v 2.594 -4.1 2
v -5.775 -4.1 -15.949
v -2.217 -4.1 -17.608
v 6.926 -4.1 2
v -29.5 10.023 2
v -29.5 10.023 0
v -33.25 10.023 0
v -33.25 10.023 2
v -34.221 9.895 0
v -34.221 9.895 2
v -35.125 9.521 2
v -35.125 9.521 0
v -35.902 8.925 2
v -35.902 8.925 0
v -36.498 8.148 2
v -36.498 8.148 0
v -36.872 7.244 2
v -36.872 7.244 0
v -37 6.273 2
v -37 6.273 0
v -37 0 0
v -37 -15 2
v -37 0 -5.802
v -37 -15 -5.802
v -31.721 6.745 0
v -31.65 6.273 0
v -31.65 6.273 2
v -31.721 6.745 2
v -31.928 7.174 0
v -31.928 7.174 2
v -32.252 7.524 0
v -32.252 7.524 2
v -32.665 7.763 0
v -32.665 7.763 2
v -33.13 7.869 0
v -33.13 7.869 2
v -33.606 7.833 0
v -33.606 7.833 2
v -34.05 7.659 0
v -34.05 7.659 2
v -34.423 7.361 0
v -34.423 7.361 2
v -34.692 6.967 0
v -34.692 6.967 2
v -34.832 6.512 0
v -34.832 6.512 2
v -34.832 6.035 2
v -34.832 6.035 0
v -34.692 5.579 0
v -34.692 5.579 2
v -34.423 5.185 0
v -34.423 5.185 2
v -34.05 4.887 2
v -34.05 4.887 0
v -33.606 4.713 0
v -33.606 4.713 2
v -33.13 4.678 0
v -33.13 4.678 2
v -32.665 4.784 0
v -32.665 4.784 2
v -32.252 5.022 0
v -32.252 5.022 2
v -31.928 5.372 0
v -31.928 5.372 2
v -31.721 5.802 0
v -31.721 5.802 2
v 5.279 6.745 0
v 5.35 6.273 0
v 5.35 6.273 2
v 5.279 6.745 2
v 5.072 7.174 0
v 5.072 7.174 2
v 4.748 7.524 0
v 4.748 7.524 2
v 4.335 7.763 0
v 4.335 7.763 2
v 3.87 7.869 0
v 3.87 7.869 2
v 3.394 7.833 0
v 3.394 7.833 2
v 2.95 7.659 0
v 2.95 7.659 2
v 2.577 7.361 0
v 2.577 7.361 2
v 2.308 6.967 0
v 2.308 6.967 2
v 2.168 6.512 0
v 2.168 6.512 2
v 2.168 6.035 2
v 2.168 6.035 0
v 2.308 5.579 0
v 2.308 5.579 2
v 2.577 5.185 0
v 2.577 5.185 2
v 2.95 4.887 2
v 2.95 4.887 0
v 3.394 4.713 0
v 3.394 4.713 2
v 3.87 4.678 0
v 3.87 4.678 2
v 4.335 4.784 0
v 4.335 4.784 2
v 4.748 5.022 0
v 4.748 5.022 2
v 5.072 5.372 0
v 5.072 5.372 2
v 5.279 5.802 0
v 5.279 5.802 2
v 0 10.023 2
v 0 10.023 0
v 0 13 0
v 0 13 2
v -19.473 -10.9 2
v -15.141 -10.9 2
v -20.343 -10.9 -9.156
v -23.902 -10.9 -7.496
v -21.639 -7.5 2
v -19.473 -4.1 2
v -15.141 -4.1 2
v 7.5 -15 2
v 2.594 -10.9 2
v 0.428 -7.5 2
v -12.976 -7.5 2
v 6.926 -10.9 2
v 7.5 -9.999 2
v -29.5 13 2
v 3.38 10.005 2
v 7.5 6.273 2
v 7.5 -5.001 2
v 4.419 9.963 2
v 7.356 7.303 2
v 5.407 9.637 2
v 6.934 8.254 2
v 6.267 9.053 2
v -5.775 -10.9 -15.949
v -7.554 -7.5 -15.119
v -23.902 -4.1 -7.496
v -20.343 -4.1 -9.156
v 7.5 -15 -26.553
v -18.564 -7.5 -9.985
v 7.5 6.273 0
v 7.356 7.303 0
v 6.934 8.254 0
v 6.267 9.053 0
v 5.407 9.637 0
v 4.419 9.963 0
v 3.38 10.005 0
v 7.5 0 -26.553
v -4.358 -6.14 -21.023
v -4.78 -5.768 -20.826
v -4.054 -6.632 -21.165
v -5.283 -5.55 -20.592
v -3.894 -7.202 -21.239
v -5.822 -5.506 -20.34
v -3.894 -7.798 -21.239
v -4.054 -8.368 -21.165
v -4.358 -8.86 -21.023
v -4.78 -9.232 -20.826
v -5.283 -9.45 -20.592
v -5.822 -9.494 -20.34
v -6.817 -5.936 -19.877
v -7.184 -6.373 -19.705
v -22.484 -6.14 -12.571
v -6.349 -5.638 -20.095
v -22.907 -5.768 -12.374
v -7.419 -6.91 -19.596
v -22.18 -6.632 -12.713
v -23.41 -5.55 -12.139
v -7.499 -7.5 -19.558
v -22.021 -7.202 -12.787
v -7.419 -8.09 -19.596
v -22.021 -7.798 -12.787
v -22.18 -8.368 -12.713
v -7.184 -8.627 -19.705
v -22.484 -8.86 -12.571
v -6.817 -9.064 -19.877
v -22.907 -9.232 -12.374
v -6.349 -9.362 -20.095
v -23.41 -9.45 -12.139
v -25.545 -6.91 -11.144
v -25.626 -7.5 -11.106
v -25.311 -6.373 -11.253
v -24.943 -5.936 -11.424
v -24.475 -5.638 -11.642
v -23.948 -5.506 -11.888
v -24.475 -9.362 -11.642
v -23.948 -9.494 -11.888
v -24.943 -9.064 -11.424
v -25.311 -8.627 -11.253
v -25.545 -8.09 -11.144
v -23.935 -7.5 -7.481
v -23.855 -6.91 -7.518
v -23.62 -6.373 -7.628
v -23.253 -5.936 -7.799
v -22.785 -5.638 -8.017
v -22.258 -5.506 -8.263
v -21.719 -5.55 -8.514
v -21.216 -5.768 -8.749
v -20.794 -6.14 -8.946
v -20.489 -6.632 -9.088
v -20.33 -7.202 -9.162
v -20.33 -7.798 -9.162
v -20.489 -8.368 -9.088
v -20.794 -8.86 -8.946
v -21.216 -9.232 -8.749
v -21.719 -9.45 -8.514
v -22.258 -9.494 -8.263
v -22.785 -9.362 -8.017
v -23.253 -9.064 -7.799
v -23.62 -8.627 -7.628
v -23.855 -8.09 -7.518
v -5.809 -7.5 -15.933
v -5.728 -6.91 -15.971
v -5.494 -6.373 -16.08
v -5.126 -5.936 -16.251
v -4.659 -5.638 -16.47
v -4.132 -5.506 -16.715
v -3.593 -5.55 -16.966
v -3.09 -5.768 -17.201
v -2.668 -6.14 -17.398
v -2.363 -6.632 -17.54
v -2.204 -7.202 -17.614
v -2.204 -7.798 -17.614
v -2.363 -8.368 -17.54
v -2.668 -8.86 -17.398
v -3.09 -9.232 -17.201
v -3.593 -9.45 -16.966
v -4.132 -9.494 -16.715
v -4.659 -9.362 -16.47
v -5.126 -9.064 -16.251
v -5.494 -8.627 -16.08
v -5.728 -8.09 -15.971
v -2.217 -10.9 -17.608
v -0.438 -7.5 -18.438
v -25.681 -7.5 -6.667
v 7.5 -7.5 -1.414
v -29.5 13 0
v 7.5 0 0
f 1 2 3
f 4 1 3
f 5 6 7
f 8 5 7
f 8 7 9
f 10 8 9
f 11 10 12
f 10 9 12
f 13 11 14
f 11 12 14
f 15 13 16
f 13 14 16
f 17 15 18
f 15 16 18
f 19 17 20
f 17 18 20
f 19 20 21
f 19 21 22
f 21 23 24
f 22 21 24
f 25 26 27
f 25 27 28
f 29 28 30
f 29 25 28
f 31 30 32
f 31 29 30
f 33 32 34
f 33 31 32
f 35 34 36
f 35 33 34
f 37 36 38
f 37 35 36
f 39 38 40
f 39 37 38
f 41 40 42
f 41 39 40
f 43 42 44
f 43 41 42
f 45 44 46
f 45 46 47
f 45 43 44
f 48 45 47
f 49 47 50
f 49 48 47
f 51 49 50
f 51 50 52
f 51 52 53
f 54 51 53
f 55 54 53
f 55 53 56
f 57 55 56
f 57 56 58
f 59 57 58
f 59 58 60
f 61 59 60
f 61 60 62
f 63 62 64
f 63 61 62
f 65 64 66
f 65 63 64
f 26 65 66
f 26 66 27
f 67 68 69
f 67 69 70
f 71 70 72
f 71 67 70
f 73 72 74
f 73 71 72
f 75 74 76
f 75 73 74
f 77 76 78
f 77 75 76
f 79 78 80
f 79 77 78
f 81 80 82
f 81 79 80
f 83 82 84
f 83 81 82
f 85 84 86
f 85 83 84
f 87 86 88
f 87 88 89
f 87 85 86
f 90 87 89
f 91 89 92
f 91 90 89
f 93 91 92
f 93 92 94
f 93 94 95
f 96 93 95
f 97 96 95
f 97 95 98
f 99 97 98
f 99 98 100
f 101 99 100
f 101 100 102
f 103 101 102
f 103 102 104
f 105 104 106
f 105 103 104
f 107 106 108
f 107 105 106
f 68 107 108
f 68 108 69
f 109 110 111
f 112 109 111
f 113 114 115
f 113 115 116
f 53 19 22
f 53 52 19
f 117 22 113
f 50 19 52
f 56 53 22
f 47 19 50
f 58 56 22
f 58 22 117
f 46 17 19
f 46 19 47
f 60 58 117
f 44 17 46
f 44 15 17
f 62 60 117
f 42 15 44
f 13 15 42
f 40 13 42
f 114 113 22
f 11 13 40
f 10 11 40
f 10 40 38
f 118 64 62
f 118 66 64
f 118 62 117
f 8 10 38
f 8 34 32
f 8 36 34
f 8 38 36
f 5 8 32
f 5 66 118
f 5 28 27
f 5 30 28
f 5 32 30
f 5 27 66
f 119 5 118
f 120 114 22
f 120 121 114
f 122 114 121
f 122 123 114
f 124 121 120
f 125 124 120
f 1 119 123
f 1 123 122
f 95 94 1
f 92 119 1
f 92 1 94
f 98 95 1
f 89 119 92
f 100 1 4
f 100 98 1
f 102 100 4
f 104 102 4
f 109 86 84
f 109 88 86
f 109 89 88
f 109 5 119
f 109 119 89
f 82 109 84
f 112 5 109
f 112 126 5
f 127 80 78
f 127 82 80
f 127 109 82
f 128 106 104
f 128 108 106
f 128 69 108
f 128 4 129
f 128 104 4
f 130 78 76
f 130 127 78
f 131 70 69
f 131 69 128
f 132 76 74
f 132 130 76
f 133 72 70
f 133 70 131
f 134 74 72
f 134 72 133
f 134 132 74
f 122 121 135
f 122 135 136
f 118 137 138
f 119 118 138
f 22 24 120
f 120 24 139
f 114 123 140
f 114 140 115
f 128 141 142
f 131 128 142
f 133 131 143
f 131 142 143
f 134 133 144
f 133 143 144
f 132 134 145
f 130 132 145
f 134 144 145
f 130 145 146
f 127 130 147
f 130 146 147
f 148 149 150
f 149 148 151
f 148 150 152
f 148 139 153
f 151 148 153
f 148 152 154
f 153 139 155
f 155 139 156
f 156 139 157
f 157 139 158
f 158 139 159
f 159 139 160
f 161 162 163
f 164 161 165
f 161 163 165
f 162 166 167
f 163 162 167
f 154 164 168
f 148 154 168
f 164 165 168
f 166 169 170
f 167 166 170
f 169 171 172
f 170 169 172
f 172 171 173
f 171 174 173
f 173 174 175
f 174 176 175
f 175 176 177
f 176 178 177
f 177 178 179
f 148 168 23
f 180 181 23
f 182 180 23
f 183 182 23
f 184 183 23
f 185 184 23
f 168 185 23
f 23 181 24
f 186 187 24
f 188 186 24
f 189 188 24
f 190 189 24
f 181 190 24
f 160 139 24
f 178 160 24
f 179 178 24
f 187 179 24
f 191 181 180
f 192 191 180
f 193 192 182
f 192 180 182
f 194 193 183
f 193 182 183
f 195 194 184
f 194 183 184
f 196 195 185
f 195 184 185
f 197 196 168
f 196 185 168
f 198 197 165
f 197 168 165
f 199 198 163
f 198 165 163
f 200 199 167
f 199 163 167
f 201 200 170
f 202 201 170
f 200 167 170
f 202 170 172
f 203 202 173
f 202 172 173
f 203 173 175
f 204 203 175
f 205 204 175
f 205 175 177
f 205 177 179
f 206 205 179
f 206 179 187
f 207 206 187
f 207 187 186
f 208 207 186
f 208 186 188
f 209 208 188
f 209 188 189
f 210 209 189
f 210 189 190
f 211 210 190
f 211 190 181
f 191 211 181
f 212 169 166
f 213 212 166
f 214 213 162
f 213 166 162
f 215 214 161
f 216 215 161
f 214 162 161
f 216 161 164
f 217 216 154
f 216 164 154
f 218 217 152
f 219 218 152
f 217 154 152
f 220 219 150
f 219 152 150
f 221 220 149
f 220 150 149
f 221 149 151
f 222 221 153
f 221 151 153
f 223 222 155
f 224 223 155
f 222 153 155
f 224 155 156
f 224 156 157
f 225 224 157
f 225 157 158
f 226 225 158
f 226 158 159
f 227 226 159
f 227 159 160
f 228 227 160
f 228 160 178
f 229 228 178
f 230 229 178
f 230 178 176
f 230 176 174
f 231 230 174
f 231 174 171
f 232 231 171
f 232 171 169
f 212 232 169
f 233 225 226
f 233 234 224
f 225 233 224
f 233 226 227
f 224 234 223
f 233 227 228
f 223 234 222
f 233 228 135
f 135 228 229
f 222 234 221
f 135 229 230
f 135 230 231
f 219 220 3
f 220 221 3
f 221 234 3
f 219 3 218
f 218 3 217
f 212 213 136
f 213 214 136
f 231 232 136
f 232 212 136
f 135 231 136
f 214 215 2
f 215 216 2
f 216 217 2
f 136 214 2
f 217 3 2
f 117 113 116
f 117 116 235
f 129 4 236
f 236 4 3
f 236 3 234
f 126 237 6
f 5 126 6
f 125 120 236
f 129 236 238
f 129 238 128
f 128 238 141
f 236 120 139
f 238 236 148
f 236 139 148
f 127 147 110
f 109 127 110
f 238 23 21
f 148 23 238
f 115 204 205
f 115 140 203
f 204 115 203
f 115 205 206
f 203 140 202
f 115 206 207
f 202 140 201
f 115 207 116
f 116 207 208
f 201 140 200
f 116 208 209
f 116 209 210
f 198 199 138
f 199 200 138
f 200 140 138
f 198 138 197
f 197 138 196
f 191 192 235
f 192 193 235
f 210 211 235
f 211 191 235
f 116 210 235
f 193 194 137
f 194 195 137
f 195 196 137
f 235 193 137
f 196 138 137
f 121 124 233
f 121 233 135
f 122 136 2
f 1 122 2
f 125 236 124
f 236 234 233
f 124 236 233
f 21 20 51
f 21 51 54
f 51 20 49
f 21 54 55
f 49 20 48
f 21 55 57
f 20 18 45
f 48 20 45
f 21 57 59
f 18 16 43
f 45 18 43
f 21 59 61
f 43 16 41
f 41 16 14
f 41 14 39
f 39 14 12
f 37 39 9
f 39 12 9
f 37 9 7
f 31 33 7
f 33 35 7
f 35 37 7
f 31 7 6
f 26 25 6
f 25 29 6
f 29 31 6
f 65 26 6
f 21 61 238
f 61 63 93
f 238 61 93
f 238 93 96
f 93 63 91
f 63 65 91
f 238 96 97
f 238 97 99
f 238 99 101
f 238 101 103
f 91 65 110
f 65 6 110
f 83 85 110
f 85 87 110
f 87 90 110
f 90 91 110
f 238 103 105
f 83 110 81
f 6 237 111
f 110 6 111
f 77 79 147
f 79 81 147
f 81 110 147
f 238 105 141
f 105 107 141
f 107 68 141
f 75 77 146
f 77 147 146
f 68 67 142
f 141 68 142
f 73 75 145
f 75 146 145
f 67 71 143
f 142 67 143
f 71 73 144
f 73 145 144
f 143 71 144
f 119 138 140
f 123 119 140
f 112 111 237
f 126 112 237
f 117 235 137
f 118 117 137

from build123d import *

# Parameters (mm, degrees)
SKETCH1_R           = 3.75
SKETCH1_R_2         = 1.6
BOSS_EXTRUDE1_DEPTH = 2
BOSS_EXTRUDE2_START = -15
BOSS_EXTRUDE2_DEPTH = 15
BOSS_EXTRUDE3_DEPTH = 2
SKETCH2_R           = 2
CUT_EXTRUDE1_DEPTH  = 39.169212171
CUT_EXTRUDE2_START  = -4
SKETCH2_3_R         = 2
CUT_EXTRUDE2_DEPTH  = 35.169212171


# Read off the part's stored shape, not the designer's step: Boss-Extrude2
with BuildPart() as part:
    # Sketch1 → Boss-Extrude1 (new body)
    # profile 1 of 5: a face of its own
    with BuildSketch(Plane.XY):
        with Locations((-33.25, 6.273123532)):
            Circle(SKETCH1_R)
        with Locations((-33.25, 6.273123532)):
            Circle(SKETCH1_R_2, mode=Mode.SUBTRACT)
    # profile 2 of 5: a face of its own
    with BuildSketch(Plane.XY):
        with BuildLine():
            Line((0, 2.523123532), (3.75, 2.523123532))
            ThreePointArc((3.75, 2.523123532), (0.004577287, 6.087897443), (3.38, 10.004825556))
            Line((3.38, 10.004825556), (0, 10.023123532))
            Line((0, 10.023123532), (0, 13))
            Line((0, 13), (-29.5, 13))
            Line((-29.5, 13), (-29.5, 10.023123532))
            Line((-29.5, 10.023123532), (-33.25, 10.023123532))
            ThreePointArc((-33.25, 10.023123532), (-30.598349571, 8.924773961), (-29.5, 6.273123532))
            ThreePointArc((-29.5, 6.273123532), (-30.598349571, 3.621473102), (-33.25, 2.523123532))
            Line((-33.25, 2.523123532), (-29.5, 2.523123532))
            Line((-29.5, 2.523123532), (-29.5, 0))
            Line((-29.5, 0), (0, 0))
            Line((0, 0), (0, 2.523123532))
        make_face()
    # profile 3 of 5: a face of its own
    with BuildSketch(Plane.XY):
        with Locations((3.75, 6.273123532)):
            Circle(SKETCH1_R)
        with Locations((3.75, 6.273123532)):
            Circle(SKETCH1_R_2, mode=Mode.SUBTRACT)
    # profile 4 of 5: a face of its own
    with BuildSketch(Plane.XY):
        with BuildLine():
            ThreePointArc((7.5, 6.273123532), (6.401650429, 3.621473102), (3.75, 2.523123532))
            Line((3.75, 2.523123532), (0, 2.523123532))
            Line((0, 2.523123532), (0, 0))
            Line((0, 0), (7.5, 0))
            Line((7.5, 0), (7.5, 6.273123532))
        make_face()
    # profile 5 of 5: a face of its own
    with BuildSketch(Plane.XY):
        with BuildLine():
            Line((-37, 0), (-29.5, 0))
            Line((-29.5, 0), (-29.5, 2.523123532))
            Line((-29.5, 2.523123532), (-33.25, 2.523123532))
            ThreePointArc((-33.25, 2.523123532), (-35.901650429, 3.621473102), (-37, 6.273123532))
            Line((-37, 6.273123532), (-37, 0))
        make_face()
    extrude(amount=BOSS_EXTRUDE1_DEPTH)



with BuildPart() as body_2:
    # Boss-Extrude2 outline → Boss-Extrude2 (new body)
    with BuildSketch(Plane(origin=(0, 0, 0), x_dir=(1, 0, 0), z_dir=(0, 1, 0)).offset(BOSS_EXTRUDE2_START)):
        Polygon((7.5, 0), (7.5, 26.552667029), (-37, 5.801976241), (-37, 0), align=None)
    extrude(amount=BOSS_EXTRUDE2_DEPTH)


with BuildPart() as part_1:
    add(part.part)

    add(body_2.part)  # Boss-Extrude3 merges body 2
    # Sketch1<5> → Boss-Extrude3 (add)
    with BuildSketch(Plane.XY):
        Polygon((7.5, 0), (0, 0), (-29.5, 0), (-37, 0), (-37, -15), (7.5, -15), align=None)
    extrude(amount=BOSS_EXTRUDE3_DEPTH)

    # Sketch2 → Cut-Extrude1 (cut, through all)
    with BuildSketch(Plane(origin=(-8.83071505, 0, -18.937529538), x_dir=(-0.9063077870366508, 0, 0.42261826174069766), z_dir=(-0.4226182617406977, 1.198406961524809e-15, -0.9063077870366509))):
        with Locations((16.531049613, -7.5)):
            Circle(SKETCH2_R)
        with Locations((-3.468950387, -7.5)):
            Circle(SKETCH2_R)
    extrude(amount=-CUT_EXTRUDE1_DEPTH, mode=Mode.SUBTRACT)

    # Sketch2<3> → Cut-Extrude2 (cut, through all)
    # profile 1 of 2: a face of its own
    with BuildSketch(Plane(origin=(-8.83071505, 0, -18.937529538), x_dir=(-0.9063077870366508, 0, 0.42261826174069766), z_dir=(-0.4226182617406977, 1.198406961524809e-15, -0.9063077870366509)).offset(CUT_EXTRUDE2_START)):
        Polygon((12.605067782, -7.5), (14.568058697, -10.9), (18.494040528, -10.9), (20.457031443, -7.5), (18.494040528, -4.1), (14.568058697, -4.1), align=None)
        with Locations((16.531049613, -7.5)):
            Circle(SKETCH2_3_R, mode=Mode.SUBTRACT)
    # profile 2 of 2: a face of its own
    with BuildSketch(Plane(origin=(-8.83071505, 0, -18.937529538), x_dir=(-0.9063077870366508, 0, 0.42261826174069766), z_dir=(-0.4226182617406977, 1.198406961524809e-15, -0.9063077870366509)).offset(CUT_EXTRUDE2_START)):
        Polygon((-5.431941303, -4.1), (-7.394932218, -7.5), (-5.431941303, -10.9), (-1.505959472, -10.9), (0.457031443, -7.5), (-1.505959472, -4.1), align=None)
        with Locations((-3.468950387, -7.5)):
            Circle(SKETCH2_3_R, mode=Mode.SUBTRACT)
    extrude(amount=-CUT_EXTRUDE2_DEPTH, mode=Mode.SUBTRACT)


solid = part_1.part
